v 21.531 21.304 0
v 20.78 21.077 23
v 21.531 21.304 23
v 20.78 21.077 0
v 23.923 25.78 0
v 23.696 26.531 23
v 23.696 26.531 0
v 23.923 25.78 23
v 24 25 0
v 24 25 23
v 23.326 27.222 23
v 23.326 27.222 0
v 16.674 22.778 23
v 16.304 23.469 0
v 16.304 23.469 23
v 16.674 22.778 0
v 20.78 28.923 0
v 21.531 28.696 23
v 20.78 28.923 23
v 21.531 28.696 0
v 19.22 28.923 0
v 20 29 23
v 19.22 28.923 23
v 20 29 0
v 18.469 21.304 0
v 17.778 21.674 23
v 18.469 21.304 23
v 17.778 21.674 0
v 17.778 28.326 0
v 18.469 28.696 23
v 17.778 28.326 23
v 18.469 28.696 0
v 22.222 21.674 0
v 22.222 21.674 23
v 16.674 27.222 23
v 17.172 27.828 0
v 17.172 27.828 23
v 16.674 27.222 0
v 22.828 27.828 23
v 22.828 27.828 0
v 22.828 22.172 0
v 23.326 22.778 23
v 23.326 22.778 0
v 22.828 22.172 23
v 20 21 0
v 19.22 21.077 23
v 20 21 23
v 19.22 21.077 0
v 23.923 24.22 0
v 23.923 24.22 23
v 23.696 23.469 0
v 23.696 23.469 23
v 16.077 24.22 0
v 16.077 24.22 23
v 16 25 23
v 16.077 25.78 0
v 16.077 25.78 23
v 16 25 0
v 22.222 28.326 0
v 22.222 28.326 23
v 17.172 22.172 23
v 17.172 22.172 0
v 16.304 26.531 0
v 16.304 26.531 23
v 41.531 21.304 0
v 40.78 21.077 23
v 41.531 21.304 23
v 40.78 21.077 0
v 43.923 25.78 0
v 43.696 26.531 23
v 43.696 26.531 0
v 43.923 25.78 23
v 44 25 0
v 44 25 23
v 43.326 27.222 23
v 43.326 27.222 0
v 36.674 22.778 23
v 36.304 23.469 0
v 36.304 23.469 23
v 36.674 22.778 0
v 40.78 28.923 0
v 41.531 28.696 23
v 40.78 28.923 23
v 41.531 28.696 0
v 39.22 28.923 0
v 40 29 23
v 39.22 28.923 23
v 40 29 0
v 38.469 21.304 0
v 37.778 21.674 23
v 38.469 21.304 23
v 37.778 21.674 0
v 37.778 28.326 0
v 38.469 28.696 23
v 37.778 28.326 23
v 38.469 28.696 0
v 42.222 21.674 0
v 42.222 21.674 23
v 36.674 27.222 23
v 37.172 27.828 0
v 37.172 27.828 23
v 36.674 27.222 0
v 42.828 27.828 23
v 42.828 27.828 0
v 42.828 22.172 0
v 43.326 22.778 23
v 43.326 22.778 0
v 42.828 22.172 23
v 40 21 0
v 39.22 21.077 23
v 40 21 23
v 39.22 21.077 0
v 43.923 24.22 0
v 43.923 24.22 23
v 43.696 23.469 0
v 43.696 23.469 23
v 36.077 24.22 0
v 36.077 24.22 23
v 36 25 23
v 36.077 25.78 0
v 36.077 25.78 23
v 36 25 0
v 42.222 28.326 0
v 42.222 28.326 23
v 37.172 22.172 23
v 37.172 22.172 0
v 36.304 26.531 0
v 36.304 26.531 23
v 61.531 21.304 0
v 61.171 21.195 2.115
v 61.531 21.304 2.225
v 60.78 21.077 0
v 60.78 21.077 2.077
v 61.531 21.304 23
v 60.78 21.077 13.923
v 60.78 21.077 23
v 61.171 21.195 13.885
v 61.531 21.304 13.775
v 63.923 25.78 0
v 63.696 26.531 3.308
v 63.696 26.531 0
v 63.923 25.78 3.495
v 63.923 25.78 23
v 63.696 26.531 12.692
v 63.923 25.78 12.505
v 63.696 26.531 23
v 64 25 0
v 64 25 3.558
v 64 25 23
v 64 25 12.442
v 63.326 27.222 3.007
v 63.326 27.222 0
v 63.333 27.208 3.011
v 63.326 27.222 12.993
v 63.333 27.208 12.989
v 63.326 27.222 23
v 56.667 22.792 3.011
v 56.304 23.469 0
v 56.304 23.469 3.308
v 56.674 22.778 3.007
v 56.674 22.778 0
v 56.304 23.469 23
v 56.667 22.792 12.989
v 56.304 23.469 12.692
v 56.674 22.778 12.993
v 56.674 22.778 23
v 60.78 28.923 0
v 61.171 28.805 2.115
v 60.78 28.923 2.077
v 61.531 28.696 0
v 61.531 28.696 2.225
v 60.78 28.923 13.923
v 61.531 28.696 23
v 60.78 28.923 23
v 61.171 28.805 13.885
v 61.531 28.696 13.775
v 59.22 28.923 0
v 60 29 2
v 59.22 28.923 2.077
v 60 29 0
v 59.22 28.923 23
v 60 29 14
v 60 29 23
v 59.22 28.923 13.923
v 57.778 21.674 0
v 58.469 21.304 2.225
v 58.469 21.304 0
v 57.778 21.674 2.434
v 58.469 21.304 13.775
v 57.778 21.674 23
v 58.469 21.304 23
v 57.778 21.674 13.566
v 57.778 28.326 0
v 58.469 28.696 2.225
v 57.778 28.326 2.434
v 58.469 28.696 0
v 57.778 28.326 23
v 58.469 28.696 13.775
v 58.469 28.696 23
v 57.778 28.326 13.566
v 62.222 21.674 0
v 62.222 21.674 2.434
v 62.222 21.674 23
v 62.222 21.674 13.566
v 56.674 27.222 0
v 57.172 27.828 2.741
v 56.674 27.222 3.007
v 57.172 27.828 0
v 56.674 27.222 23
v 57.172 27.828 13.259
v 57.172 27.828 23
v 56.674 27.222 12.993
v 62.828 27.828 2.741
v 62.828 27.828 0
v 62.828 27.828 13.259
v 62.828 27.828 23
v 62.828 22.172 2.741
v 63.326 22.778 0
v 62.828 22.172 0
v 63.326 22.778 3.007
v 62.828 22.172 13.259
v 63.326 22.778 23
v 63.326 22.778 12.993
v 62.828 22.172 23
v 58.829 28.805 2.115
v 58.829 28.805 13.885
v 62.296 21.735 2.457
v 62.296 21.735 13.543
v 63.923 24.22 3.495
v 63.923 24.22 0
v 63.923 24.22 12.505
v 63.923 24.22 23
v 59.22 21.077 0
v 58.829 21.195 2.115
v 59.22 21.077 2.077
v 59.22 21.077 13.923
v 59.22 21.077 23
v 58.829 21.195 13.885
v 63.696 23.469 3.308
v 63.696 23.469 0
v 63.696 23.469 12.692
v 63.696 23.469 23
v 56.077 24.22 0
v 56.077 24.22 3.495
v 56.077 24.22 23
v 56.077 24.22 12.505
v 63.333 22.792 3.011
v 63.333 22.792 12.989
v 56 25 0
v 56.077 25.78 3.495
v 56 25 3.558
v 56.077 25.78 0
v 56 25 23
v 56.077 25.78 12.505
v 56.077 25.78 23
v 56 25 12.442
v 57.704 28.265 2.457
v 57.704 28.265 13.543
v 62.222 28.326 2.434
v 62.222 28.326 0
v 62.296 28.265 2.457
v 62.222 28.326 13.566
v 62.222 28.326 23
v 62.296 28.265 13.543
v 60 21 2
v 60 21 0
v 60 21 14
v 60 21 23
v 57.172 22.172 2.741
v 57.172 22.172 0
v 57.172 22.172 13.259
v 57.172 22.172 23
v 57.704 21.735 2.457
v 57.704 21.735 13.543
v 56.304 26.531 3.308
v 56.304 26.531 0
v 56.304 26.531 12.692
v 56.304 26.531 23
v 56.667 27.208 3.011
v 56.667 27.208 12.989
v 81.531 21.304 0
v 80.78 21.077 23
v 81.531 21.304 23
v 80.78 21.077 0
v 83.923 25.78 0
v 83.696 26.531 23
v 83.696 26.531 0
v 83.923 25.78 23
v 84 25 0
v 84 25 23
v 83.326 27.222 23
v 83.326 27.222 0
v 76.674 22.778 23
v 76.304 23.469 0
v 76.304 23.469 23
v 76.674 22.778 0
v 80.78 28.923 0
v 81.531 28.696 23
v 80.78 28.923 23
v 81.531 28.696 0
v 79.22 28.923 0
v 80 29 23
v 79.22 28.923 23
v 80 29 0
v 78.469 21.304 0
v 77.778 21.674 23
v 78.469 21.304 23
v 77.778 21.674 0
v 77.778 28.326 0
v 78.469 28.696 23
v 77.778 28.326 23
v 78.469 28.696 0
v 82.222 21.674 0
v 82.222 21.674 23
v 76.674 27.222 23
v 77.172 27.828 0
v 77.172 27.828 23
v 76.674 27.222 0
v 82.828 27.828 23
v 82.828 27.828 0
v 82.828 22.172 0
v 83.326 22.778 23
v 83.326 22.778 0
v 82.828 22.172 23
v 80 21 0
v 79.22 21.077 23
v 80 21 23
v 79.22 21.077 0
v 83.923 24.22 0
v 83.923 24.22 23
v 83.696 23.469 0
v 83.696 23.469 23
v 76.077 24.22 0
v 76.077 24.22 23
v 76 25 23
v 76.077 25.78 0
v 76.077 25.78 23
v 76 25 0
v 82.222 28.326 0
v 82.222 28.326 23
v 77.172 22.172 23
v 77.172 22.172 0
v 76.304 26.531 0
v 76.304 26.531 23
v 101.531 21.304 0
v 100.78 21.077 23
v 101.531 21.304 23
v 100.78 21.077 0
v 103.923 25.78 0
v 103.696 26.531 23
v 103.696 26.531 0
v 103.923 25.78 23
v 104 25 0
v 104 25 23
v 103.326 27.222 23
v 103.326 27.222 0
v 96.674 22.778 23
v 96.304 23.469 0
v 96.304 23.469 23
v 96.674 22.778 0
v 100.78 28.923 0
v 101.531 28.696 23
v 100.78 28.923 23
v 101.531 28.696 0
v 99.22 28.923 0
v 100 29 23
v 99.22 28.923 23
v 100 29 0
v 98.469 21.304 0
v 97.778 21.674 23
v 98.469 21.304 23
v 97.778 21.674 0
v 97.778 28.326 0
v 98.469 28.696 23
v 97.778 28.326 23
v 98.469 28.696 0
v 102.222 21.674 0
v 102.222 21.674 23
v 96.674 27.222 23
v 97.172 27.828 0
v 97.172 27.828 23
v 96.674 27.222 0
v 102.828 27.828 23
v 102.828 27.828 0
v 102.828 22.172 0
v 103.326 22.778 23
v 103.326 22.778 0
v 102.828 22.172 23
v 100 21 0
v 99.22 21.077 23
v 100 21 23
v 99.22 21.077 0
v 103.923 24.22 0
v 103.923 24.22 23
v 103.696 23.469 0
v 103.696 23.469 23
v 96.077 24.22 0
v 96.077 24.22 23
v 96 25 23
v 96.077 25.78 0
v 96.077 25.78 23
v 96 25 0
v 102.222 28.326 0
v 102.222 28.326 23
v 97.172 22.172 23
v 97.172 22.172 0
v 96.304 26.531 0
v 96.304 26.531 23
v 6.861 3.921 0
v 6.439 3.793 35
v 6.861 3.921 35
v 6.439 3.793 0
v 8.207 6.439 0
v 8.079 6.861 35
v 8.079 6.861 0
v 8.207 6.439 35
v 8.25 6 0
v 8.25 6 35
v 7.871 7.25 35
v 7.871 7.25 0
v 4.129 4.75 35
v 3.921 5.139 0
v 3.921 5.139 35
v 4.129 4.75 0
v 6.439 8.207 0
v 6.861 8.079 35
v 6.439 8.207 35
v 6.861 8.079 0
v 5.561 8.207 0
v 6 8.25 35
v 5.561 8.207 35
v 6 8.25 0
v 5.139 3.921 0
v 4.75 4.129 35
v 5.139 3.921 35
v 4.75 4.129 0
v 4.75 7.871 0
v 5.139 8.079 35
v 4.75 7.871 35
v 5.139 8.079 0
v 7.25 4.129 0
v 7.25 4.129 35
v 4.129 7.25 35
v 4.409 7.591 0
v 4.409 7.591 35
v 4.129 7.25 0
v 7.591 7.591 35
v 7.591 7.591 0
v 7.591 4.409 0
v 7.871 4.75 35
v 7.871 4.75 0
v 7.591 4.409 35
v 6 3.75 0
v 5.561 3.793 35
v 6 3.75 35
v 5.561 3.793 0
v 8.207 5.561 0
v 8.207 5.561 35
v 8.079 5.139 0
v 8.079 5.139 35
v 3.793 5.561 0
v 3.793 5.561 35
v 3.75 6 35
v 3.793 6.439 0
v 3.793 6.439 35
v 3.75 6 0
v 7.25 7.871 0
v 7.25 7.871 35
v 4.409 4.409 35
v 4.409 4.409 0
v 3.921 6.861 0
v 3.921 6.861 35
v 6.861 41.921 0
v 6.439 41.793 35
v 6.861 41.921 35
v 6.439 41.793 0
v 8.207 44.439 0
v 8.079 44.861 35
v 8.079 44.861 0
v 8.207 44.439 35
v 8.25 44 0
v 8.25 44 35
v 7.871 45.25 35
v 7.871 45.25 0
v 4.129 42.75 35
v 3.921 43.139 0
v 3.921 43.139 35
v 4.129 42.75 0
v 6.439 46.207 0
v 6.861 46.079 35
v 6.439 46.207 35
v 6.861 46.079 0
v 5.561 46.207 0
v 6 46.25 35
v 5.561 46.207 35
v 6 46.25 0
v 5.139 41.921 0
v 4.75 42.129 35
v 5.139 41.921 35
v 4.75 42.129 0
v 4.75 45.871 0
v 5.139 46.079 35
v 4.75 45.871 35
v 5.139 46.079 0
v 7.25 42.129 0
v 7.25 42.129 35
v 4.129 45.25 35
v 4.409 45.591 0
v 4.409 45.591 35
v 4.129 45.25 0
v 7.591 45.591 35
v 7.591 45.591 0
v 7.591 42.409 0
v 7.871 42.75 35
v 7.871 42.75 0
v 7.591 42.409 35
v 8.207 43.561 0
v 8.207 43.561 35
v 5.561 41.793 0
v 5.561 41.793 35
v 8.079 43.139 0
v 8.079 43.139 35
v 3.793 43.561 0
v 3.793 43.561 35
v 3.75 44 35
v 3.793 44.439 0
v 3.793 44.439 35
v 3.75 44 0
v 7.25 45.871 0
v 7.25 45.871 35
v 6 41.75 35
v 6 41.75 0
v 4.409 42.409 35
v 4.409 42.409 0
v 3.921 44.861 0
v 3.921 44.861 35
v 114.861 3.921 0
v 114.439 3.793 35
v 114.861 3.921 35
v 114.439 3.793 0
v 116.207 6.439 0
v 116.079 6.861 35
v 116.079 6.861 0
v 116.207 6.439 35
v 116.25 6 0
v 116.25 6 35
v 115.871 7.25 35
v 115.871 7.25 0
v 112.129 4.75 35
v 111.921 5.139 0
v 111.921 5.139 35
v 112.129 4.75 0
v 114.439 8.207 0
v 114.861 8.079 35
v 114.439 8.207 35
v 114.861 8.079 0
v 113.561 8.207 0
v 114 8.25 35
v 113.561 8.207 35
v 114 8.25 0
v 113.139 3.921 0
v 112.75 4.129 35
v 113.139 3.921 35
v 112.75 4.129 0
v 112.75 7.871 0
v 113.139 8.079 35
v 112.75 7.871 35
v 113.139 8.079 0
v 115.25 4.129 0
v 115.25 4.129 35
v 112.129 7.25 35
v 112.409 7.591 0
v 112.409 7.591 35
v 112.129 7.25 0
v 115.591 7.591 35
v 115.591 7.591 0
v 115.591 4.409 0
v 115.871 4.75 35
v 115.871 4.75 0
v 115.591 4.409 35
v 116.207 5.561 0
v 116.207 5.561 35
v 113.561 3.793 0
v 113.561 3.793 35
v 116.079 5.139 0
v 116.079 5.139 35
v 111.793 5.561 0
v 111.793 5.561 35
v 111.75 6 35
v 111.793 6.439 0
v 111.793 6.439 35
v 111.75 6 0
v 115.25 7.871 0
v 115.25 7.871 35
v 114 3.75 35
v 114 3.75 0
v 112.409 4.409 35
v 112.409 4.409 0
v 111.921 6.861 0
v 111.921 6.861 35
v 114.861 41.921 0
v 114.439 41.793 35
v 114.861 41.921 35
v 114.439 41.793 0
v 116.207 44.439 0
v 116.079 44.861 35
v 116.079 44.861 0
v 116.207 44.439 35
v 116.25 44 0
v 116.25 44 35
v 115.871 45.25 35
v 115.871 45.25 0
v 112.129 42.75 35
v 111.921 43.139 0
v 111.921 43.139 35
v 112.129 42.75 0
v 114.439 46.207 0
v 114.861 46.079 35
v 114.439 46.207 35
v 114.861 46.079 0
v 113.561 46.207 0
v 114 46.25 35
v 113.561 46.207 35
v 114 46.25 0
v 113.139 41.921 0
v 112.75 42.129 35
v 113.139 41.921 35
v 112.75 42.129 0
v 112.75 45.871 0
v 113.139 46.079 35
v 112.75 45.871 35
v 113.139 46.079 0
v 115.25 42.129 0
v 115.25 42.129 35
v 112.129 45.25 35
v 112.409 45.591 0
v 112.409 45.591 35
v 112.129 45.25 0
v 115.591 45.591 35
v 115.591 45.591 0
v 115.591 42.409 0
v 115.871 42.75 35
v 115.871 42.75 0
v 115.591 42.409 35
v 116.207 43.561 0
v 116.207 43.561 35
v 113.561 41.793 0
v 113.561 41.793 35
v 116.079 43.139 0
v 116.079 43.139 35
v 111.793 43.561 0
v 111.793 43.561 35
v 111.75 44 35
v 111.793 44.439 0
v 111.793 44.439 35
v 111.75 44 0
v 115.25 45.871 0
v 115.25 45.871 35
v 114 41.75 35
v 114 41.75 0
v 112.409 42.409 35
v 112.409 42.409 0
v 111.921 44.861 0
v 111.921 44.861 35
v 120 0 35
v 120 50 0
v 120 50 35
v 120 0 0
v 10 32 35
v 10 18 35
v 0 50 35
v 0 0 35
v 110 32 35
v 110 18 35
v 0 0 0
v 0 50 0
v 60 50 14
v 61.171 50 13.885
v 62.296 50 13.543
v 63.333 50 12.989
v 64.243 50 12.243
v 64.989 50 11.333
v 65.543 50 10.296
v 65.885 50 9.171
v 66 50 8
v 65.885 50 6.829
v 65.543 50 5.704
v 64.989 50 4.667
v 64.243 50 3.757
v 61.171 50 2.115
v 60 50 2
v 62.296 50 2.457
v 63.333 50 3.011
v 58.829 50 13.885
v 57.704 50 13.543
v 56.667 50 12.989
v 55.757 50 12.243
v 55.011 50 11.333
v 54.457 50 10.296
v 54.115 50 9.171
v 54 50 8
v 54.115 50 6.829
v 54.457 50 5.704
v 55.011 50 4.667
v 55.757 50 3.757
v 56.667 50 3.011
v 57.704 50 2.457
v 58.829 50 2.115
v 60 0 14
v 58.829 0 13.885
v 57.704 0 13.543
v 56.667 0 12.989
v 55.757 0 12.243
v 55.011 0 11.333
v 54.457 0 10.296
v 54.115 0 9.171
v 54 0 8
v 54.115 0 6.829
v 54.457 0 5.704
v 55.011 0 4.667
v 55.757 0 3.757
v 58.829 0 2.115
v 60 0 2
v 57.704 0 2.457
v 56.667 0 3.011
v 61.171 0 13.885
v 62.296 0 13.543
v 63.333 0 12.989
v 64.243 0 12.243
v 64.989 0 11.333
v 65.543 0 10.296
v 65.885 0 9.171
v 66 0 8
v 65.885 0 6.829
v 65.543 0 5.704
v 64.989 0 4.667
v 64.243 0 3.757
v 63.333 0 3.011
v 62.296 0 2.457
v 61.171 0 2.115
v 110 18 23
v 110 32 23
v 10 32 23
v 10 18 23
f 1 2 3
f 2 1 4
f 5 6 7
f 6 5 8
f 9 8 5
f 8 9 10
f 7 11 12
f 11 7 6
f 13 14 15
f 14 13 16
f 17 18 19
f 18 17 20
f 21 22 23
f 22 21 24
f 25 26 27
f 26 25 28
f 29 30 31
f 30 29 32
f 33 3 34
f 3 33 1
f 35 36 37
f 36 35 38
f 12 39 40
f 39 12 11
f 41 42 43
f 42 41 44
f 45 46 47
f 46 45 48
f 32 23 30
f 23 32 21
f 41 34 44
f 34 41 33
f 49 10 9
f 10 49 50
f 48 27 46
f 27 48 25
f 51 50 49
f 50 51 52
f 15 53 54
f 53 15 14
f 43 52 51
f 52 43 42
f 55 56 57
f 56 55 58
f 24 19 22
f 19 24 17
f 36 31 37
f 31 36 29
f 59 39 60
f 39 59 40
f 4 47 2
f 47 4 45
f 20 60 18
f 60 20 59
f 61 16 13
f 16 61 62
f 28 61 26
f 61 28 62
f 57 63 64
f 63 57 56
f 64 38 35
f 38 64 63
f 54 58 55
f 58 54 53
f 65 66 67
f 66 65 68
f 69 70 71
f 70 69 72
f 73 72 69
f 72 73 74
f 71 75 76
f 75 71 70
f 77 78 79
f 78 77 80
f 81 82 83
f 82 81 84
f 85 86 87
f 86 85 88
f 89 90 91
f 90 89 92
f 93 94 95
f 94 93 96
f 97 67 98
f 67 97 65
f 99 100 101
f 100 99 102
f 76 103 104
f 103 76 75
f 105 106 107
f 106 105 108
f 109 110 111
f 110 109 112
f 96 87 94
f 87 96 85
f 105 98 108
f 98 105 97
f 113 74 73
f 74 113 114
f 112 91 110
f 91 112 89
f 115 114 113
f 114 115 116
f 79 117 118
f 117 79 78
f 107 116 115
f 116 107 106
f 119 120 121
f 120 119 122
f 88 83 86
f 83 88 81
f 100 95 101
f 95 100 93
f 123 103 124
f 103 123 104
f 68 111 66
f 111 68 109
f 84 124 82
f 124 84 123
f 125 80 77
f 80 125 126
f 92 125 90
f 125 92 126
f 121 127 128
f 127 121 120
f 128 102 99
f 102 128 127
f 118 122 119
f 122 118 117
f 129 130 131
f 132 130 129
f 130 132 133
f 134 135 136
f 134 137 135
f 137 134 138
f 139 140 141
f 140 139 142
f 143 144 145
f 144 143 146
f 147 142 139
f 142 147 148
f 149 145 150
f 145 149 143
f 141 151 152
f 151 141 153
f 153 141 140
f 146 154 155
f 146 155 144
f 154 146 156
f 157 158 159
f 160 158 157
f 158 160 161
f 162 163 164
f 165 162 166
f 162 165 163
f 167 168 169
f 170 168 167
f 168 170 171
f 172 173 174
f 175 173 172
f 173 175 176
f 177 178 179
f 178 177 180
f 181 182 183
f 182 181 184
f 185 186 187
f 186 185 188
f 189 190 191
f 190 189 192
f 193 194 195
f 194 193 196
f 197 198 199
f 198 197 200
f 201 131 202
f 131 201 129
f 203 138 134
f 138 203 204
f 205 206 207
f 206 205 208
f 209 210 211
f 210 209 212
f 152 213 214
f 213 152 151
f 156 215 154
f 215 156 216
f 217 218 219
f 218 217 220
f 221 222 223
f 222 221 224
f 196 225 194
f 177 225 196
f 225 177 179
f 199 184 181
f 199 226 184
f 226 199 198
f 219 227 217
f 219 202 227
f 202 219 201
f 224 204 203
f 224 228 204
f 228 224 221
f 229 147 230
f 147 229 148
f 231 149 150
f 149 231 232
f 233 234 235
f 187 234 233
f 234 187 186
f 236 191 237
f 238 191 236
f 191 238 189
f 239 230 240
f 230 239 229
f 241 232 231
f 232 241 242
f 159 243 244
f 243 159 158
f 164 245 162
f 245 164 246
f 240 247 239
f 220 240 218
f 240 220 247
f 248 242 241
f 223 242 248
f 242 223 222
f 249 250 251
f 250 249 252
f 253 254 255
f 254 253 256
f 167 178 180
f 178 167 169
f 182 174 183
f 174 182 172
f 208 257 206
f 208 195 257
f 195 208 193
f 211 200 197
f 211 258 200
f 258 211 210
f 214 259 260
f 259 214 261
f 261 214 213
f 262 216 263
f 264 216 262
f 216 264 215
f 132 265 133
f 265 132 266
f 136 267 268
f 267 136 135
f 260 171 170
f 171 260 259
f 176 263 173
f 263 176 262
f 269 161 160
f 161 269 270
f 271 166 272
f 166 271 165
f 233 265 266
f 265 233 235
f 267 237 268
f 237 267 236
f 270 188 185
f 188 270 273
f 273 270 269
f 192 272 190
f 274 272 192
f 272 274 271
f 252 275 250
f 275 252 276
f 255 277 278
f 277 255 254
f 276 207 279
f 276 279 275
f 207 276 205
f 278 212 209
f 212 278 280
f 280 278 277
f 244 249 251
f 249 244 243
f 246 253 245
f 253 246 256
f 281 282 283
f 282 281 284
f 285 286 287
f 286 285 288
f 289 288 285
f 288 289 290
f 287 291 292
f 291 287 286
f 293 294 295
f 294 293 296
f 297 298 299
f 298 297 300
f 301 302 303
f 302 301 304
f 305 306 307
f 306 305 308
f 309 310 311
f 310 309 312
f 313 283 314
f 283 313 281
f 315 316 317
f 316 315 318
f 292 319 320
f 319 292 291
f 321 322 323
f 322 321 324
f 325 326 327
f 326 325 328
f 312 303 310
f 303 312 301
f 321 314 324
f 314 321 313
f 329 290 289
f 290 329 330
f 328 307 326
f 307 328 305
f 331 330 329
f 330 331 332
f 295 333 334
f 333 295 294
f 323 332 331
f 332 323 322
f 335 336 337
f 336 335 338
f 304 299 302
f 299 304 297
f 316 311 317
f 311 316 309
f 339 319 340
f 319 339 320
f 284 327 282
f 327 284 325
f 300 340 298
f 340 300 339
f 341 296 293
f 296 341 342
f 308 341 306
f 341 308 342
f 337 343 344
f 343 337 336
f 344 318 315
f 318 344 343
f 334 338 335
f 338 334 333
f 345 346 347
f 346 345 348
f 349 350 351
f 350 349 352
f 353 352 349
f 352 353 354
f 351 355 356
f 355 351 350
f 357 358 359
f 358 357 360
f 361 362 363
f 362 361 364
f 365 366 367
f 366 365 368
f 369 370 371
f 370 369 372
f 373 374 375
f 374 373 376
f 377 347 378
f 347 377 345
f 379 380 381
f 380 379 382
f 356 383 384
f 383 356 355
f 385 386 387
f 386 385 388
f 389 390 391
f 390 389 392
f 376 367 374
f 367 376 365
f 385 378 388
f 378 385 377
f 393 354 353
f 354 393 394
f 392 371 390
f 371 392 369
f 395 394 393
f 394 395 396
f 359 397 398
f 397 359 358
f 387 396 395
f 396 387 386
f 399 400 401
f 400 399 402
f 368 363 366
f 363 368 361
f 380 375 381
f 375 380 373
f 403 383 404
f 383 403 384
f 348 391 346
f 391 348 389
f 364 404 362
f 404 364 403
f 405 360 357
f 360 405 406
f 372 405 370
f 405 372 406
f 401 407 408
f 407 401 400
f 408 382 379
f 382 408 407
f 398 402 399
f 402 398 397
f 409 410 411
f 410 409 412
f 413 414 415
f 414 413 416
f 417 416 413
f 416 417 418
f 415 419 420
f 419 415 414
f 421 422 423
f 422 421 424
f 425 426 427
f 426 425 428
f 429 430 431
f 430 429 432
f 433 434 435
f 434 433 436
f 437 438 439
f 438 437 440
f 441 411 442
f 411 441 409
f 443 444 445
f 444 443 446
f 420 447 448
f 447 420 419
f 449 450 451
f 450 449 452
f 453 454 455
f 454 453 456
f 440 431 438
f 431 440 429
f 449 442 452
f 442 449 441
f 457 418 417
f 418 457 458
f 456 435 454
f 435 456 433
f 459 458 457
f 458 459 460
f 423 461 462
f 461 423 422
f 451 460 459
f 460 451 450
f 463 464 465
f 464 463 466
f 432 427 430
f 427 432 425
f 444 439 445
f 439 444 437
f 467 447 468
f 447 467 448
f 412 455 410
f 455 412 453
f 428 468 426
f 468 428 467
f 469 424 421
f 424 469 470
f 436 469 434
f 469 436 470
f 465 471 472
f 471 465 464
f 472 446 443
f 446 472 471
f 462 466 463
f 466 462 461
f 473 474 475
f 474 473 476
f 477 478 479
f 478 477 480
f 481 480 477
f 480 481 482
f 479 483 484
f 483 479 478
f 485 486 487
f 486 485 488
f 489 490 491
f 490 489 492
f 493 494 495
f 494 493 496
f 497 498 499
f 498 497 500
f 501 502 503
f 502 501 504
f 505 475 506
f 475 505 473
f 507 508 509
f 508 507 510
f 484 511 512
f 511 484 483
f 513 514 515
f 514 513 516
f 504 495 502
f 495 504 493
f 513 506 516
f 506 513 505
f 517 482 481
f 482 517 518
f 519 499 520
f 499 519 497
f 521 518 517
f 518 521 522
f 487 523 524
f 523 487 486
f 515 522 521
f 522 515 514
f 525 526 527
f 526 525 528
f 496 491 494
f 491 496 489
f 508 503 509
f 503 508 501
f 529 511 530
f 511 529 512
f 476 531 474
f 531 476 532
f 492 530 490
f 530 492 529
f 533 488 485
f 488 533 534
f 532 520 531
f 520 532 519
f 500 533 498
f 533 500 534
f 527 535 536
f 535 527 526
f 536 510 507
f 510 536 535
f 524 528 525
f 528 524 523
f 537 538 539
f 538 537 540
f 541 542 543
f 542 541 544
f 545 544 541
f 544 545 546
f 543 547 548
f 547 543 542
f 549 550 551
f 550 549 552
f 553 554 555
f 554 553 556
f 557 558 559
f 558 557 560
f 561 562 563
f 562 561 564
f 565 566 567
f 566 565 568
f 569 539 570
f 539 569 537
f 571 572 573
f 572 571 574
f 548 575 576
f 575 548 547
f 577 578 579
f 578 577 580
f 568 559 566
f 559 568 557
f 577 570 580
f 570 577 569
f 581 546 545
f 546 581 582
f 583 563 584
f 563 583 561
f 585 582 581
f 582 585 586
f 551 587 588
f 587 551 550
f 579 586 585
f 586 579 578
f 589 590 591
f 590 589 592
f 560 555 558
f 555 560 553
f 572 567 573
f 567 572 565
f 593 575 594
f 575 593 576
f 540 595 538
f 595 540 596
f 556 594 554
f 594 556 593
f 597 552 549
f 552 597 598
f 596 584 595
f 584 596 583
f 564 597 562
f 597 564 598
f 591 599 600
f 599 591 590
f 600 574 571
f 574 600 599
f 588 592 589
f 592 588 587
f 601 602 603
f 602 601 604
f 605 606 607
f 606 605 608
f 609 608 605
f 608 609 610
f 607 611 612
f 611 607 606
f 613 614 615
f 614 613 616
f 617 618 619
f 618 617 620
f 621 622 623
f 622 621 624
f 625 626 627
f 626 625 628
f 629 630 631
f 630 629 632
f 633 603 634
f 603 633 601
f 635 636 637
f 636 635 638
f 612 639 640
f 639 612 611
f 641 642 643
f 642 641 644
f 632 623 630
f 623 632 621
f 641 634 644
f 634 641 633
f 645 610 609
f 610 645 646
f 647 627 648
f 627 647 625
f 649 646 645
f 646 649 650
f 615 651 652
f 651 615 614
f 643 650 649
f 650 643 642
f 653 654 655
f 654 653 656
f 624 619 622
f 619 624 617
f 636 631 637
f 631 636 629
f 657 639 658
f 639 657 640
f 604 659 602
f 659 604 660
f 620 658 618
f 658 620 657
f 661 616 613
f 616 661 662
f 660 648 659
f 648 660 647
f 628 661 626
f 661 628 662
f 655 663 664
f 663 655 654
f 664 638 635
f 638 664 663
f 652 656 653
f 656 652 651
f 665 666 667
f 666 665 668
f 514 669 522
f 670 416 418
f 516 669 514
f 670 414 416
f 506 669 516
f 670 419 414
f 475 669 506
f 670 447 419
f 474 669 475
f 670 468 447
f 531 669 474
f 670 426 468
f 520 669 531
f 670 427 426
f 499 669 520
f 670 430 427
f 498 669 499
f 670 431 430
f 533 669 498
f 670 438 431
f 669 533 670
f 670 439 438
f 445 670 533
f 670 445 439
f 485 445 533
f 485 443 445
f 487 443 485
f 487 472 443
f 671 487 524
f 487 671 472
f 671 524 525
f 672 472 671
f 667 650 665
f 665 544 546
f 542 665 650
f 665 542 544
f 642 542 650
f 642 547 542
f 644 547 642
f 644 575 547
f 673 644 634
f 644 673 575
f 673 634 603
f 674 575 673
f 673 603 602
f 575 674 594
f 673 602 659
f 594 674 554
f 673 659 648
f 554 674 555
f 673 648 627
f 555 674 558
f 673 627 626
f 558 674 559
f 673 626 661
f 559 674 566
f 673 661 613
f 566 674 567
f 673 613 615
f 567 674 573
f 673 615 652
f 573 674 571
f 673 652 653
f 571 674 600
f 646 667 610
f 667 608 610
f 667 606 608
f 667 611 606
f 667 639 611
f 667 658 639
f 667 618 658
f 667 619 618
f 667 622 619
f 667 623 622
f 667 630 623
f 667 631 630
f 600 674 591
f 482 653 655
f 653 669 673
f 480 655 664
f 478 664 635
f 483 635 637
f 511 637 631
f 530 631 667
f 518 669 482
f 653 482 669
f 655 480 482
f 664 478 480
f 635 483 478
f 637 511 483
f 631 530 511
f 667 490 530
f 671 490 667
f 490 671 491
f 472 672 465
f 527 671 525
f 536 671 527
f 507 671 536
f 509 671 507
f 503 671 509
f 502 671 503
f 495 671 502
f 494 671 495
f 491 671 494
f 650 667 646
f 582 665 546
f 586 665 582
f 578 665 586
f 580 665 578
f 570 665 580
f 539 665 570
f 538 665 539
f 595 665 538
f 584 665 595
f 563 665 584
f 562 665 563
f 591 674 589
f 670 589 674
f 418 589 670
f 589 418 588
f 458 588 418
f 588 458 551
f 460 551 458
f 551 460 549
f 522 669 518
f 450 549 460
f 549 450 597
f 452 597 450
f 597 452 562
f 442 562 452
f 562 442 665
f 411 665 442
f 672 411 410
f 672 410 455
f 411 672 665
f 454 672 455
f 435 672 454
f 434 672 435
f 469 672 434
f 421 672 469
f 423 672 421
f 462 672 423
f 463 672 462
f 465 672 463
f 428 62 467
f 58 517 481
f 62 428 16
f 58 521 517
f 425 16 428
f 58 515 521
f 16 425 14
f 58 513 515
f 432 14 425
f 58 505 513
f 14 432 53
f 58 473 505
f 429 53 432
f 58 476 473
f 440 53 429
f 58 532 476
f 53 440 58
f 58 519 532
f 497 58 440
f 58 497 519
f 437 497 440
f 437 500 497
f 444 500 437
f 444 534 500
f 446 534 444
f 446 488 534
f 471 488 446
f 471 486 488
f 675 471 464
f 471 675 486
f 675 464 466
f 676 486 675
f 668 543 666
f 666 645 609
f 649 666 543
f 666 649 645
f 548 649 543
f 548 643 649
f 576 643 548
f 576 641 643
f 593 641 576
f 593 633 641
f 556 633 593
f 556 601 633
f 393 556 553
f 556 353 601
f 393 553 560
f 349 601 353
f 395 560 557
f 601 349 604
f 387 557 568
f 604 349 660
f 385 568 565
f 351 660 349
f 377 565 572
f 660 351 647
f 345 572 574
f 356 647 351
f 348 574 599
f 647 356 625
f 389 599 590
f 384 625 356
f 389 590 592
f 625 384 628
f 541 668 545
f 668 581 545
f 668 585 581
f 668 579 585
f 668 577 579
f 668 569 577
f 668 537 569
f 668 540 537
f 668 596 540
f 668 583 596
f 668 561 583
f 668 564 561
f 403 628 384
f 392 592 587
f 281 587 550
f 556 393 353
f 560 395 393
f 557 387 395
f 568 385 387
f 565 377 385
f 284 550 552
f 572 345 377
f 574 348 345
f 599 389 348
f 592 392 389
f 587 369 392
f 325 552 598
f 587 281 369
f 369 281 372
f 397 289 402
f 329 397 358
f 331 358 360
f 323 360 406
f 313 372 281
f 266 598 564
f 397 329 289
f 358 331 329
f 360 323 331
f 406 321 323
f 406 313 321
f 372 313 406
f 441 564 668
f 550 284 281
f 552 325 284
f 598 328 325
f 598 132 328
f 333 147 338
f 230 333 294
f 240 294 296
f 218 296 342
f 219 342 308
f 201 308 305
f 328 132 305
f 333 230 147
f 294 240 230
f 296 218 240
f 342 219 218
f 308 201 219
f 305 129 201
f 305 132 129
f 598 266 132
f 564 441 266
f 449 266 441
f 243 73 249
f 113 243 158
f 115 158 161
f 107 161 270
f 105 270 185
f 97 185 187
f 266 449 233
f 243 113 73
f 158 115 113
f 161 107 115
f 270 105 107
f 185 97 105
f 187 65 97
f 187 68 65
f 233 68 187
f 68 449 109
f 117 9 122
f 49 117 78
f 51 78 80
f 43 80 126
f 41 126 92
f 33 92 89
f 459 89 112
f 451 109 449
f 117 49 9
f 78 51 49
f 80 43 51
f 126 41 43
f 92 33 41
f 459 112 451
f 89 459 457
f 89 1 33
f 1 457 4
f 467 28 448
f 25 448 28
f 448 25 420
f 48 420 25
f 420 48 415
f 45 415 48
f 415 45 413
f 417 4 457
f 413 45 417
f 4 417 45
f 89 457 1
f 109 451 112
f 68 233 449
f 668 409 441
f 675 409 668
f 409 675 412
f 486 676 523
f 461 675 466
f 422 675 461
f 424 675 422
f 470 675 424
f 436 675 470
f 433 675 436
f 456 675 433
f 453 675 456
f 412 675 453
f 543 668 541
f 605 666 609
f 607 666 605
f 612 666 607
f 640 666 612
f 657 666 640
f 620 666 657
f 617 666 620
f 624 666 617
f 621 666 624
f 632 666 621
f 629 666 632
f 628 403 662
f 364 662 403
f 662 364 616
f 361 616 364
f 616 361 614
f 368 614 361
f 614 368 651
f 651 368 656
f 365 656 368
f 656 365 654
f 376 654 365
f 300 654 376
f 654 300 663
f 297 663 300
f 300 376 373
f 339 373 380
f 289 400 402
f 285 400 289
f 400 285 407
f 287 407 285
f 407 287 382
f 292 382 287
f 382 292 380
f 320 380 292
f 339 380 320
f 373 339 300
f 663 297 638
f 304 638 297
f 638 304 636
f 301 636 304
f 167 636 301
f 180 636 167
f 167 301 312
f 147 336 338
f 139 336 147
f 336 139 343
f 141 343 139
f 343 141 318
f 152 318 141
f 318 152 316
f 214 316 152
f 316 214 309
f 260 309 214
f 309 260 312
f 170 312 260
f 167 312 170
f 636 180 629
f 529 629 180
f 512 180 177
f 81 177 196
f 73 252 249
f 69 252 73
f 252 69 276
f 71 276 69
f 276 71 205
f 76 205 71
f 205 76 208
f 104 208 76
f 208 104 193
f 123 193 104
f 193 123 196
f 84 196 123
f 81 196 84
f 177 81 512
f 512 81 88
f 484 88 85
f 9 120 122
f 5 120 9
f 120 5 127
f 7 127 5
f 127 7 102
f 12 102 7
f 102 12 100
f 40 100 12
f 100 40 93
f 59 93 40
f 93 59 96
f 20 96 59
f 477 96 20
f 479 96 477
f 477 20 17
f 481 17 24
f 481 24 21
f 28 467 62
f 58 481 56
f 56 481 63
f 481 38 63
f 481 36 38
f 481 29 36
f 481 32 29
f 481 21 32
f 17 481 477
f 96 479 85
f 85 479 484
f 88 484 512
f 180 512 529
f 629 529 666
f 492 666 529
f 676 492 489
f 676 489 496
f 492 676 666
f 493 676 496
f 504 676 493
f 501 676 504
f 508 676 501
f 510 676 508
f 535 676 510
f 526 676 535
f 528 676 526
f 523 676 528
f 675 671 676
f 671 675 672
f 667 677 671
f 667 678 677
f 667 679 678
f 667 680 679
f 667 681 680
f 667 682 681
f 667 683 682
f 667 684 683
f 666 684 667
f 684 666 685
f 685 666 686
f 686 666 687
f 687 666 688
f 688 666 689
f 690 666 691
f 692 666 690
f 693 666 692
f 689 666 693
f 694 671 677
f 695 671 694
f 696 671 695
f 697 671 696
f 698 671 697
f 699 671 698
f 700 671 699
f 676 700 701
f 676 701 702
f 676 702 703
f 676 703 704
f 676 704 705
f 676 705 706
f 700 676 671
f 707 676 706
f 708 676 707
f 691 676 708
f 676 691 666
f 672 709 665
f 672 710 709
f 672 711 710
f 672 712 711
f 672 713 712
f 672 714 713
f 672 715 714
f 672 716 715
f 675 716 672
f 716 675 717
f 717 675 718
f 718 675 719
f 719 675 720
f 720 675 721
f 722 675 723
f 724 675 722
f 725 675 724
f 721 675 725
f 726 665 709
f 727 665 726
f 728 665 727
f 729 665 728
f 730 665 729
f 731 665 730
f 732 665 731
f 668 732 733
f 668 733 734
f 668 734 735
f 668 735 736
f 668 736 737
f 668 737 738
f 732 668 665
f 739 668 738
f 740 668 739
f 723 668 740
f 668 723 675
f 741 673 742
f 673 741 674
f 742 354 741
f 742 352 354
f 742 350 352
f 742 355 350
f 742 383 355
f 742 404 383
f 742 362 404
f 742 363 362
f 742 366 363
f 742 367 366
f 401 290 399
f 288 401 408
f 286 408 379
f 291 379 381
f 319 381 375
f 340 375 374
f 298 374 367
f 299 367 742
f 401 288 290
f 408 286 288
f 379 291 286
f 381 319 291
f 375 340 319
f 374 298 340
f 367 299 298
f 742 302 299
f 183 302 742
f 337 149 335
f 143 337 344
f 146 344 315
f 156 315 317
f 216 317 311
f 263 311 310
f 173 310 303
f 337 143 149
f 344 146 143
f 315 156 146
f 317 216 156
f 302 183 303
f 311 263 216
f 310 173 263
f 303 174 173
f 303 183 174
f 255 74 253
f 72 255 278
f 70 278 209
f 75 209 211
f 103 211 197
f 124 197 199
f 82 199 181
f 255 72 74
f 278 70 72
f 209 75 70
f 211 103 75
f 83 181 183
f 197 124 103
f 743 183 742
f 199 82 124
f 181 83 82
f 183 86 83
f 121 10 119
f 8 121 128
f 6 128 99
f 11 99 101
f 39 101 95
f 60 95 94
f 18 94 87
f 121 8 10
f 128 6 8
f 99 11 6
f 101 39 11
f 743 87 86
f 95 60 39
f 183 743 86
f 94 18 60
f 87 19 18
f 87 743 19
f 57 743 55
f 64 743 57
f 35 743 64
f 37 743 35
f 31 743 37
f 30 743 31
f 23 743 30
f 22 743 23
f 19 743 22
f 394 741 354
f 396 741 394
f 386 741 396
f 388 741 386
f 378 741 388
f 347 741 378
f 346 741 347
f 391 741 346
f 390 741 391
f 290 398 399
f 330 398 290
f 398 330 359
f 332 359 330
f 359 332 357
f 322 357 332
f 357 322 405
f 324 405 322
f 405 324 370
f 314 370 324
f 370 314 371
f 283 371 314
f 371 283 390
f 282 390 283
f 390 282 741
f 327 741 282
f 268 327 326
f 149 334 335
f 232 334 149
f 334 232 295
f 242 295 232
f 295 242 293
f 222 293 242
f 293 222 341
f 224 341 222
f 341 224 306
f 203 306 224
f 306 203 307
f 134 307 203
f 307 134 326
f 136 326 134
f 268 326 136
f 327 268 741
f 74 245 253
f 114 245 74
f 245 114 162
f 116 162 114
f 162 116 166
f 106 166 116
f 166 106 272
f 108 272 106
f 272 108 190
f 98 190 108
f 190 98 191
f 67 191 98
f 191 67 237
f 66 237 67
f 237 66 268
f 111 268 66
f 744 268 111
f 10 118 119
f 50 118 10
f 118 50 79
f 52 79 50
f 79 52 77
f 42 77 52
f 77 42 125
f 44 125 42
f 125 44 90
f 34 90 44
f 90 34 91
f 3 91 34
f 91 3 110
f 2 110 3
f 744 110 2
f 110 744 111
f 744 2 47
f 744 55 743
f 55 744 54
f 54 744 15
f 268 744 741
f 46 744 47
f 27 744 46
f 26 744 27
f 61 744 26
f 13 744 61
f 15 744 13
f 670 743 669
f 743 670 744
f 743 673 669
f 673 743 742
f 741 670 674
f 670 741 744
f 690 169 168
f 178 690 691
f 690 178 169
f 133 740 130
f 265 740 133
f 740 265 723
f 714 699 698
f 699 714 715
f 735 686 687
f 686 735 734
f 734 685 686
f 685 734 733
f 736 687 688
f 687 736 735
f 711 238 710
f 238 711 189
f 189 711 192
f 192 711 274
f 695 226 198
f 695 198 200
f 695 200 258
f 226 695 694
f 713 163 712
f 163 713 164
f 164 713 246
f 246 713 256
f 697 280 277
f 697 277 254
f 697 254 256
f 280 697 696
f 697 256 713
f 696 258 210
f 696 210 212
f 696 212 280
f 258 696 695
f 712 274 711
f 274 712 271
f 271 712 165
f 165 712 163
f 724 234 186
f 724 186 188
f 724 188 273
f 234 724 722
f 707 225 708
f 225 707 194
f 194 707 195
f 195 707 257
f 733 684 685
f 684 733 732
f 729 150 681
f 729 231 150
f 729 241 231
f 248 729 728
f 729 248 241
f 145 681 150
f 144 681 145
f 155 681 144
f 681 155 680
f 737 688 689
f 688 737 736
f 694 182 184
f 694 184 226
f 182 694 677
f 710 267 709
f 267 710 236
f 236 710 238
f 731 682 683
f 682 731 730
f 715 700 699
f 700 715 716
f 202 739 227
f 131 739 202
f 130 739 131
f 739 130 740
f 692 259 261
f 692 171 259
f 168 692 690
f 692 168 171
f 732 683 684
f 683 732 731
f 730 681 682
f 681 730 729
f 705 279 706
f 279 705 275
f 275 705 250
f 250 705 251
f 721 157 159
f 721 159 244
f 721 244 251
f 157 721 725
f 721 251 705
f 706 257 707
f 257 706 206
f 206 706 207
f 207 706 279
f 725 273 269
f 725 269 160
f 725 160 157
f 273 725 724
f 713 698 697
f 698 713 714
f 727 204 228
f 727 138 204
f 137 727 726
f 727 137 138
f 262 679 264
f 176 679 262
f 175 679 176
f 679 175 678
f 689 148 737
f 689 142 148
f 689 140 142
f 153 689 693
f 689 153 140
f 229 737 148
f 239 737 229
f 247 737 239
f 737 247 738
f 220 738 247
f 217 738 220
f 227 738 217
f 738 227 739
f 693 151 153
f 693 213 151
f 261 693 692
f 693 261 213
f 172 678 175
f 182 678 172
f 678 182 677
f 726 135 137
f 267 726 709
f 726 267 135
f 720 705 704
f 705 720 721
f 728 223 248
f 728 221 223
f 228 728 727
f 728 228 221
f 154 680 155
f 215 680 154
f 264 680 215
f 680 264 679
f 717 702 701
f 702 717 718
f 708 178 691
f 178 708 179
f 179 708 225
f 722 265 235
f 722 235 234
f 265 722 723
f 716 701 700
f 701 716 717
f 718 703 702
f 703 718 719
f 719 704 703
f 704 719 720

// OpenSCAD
$fn = 32;

// ----------------------------------------------------------------------
// Manifold block: side_outlet manifold
// ----------------------------------------------------------------------

// --- parameters (mm) ---
block_l = 120;            // block length, X
block_w = 50;             // block width, Y
block_h = 35;             // block height, Z
port_d = 8;               // port bore diameter
port_pitch = 20;          // port pitch along X
gallery_d = 14;           // top gallery width, Y
gallery_depth = 12;       // gallery pocket depth
wall_p = 10;              // gallery end wall thickness, X
mnt_d = 4.5;              // mounting hole diameter
mnt_in = 6;               // mounting hole inset from the edges
out_d = 12;               // outlet bore diameter
out_z = 8;                // outlet axis height

n_ports = 5;  // ports in the row
port_x0 = (block_l - (n_ports - 1) * port_pitch) / 2;  // first port X

difference() {
  cube([block_l, block_w, block_h]);
  for (i = [0 : n_ports - 1])
    translate([port_x0 + i * port_pitch, block_w / 2, -1])
      cylinder(h = block_h + 2, d = port_d);
  translate([wall_p, block_w / 2 - gallery_d / 2, block_h - gallery_depth])
    cube([block_l - 2 * wall_p, gallery_d, gallery_depth + 1]);
  for (cx = [mnt_in, block_l - mnt_in])
    for (cy = [mnt_in, block_w - mnt_in])
      translate([cx, cy, -1]) cylinder(h = block_h + 2, d = mnt_d);
  translate([block_l / 2, -1, out_z]) rotate([-90, 0, 0])
    cylinder(h = block_w + 2, d = out_d);
}
